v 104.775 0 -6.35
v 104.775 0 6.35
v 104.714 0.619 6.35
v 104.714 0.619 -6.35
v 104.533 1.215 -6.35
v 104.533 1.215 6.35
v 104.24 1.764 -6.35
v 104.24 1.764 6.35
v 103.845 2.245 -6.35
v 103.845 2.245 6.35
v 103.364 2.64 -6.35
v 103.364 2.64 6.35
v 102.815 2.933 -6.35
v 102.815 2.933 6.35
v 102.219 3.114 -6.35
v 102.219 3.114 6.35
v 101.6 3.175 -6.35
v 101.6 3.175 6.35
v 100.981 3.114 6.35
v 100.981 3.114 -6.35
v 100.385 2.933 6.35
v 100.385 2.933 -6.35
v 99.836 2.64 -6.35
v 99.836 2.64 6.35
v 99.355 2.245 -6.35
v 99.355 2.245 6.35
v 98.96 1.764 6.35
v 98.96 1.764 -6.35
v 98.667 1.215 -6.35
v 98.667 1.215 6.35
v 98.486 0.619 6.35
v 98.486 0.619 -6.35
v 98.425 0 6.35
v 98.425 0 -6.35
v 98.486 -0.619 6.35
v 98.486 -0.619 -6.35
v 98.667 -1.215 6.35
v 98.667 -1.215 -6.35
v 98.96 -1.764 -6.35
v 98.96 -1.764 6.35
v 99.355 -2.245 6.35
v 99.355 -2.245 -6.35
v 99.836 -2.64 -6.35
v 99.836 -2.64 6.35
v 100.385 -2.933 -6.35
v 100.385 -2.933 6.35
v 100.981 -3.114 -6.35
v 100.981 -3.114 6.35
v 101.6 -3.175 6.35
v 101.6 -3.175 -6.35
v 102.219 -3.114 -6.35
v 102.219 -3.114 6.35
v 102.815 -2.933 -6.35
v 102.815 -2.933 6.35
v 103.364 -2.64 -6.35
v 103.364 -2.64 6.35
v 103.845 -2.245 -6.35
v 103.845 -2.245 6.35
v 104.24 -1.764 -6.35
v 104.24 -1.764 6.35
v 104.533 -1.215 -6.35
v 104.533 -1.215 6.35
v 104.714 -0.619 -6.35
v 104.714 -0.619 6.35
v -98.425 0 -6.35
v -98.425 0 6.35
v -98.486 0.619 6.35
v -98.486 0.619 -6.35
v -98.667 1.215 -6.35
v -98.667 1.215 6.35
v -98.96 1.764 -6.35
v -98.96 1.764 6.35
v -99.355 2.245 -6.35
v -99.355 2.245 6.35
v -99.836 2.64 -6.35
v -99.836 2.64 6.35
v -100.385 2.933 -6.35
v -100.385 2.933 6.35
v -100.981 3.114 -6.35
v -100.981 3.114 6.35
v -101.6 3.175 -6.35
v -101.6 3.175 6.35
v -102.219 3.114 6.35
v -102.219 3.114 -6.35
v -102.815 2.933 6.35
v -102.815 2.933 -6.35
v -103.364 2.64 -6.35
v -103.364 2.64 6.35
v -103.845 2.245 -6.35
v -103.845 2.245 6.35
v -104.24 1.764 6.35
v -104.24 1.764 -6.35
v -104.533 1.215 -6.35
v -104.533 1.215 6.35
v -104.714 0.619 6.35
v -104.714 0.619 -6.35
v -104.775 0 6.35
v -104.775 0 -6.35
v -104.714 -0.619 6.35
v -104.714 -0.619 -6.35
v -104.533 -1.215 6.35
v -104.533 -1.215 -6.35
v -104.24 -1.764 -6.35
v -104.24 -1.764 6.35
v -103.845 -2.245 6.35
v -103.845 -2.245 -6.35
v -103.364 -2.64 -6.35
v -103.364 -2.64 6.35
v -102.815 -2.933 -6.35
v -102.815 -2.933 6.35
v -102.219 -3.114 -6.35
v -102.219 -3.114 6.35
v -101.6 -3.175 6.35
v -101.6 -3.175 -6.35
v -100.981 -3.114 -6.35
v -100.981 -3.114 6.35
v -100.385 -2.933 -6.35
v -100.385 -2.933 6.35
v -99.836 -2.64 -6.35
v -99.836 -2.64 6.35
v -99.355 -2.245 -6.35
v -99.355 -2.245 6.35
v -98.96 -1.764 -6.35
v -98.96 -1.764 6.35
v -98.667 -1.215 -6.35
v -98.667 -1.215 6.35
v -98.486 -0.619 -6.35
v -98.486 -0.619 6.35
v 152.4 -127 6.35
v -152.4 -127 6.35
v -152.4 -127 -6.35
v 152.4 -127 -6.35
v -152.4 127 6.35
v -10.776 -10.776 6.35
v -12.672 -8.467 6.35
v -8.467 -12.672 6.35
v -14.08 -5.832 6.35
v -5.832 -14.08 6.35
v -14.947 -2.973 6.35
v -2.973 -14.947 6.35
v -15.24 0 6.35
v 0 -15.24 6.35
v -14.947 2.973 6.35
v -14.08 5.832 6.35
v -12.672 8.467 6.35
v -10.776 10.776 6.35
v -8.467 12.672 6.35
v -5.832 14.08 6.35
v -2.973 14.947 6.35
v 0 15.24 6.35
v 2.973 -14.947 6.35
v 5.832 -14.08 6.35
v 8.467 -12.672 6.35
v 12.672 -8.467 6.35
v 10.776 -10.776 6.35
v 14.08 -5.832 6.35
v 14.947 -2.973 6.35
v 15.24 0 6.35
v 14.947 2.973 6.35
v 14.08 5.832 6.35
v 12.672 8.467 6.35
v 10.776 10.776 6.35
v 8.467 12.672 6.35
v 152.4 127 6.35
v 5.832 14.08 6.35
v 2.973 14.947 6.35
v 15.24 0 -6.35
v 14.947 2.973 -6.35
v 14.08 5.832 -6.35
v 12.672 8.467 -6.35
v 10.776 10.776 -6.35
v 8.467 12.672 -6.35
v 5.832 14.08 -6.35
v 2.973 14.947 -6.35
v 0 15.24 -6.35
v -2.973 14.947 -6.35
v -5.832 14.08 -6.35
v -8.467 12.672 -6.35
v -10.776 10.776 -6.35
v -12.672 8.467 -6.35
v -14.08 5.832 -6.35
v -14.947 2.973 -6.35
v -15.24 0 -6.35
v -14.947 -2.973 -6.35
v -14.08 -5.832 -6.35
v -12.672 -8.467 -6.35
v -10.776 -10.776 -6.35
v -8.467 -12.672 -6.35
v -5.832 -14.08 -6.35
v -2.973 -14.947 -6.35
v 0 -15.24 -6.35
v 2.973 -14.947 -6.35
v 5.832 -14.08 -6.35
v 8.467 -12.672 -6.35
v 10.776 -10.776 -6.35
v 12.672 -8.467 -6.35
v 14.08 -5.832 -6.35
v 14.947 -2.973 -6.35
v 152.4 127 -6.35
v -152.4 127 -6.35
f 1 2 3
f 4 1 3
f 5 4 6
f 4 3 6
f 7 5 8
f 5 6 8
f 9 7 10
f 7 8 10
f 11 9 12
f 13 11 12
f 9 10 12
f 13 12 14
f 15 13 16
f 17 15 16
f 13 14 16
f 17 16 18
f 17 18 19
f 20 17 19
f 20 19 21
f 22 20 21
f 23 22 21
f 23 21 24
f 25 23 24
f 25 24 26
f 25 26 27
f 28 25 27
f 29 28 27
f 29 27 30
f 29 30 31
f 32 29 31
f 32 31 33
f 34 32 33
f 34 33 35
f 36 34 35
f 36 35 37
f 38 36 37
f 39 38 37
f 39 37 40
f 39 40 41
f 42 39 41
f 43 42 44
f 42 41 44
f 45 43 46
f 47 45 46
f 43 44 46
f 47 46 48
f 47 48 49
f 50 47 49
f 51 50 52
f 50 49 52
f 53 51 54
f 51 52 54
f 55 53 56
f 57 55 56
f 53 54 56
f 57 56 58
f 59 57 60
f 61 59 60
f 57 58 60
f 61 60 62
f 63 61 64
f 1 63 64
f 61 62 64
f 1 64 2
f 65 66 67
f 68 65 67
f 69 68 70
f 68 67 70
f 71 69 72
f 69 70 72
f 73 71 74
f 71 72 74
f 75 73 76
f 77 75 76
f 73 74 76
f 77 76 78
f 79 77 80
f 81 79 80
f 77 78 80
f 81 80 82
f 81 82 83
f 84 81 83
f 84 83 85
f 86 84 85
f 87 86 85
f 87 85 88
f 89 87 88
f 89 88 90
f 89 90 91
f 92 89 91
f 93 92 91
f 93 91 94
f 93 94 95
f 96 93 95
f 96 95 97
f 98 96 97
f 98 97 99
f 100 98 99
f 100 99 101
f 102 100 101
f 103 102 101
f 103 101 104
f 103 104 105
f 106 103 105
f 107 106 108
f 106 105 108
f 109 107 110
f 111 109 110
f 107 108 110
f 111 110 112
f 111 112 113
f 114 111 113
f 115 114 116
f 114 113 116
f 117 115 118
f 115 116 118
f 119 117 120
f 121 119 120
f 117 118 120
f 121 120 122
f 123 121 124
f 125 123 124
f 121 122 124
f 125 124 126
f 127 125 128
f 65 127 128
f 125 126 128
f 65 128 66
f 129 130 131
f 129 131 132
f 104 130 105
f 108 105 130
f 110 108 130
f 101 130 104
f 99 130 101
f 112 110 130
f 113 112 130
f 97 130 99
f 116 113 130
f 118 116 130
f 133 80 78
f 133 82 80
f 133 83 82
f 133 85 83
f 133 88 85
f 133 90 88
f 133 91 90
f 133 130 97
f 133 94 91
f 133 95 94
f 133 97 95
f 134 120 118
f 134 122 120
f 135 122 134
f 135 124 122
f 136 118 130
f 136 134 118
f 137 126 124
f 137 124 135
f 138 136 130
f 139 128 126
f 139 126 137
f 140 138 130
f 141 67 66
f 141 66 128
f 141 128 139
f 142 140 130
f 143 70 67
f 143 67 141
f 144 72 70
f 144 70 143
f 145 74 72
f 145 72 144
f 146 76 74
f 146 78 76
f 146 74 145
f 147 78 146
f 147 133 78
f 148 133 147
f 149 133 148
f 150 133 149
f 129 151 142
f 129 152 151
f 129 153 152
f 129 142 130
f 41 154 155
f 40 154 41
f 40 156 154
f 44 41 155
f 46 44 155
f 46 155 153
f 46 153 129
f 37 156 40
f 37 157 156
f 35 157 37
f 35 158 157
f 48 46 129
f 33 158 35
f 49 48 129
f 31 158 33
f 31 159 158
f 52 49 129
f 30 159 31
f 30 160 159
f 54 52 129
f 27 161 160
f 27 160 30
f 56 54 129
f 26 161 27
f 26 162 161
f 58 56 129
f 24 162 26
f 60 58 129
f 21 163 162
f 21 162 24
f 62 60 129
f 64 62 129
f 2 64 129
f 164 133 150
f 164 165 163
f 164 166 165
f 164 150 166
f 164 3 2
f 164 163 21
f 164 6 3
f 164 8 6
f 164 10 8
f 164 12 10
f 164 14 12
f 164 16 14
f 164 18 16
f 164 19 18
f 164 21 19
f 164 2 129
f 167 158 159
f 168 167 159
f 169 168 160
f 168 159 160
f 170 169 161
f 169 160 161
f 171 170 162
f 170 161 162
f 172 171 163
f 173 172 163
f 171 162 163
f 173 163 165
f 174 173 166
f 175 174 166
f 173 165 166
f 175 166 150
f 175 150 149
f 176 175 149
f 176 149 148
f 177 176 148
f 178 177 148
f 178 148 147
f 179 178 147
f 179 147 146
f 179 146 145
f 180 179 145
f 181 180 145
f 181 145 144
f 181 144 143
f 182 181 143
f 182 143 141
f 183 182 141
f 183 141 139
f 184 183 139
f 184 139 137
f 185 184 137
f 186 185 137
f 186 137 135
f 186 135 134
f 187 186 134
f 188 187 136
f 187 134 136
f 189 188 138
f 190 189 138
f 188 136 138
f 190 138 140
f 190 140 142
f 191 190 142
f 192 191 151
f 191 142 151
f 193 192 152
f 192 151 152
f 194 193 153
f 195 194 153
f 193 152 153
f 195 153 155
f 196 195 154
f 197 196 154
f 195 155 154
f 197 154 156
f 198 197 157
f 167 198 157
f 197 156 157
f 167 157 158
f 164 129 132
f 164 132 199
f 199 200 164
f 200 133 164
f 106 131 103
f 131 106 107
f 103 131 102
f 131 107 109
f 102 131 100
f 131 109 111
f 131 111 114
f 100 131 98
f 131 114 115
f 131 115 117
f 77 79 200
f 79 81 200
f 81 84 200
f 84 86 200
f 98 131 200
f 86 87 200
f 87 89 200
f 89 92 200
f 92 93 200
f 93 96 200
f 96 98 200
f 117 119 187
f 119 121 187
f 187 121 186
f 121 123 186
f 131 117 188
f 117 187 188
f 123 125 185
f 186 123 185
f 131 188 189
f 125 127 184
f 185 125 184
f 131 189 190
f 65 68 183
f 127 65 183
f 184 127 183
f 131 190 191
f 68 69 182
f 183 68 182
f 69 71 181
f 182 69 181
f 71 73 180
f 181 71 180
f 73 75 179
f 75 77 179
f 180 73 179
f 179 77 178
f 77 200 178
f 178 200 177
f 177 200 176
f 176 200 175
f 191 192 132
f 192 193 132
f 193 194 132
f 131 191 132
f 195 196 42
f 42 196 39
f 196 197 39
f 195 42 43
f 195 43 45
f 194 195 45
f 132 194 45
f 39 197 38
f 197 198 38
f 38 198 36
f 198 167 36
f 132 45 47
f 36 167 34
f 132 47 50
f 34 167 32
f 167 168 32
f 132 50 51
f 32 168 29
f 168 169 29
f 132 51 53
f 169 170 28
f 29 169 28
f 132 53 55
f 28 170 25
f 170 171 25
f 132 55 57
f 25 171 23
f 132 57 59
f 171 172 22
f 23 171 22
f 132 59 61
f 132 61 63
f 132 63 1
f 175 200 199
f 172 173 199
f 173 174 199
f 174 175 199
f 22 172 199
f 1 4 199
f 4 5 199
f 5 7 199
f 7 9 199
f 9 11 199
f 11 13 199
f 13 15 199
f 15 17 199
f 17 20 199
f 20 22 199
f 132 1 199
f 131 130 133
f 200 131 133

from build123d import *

# Parameters (mm, degrees)
F0_W     = 304.8
F0_H     = 254
F1_DEPTH = 6.35
F2_R     = 15.24
F3_DEPTH = 12.701
F4_R     = 3.175
F5_DEPTH = 12.701


with BuildPart() as f1:
    # F0 (on Top) → F1 (new body, symmetric)
    with BuildSketch(Plane.XY):
        Rectangle(F0_W, F0_H)
    extrude(amount=F1_DEPTH, both=True)

    # F2 (on face) → F3 (cut, through all)
    with BuildSketch(Plane.XY.offset(6.35)):
        Circle(F2_R)
    extrude(amount=-F3_DEPTH, mode=Mode.SUBTRACT)

    # F4 (on face) → F5 (cut, through all)
    with BuildSketch(Plane.XY.offset(6.35)):
        with Locations((-101.6, 0)):
            Circle(F4_R)
        with Locations((101.6, 0)):
            Circle(F4_R)
    extrude(amount=-F5_DEPTH, mode=Mode.SUBTRACT)


solid = f1.part
